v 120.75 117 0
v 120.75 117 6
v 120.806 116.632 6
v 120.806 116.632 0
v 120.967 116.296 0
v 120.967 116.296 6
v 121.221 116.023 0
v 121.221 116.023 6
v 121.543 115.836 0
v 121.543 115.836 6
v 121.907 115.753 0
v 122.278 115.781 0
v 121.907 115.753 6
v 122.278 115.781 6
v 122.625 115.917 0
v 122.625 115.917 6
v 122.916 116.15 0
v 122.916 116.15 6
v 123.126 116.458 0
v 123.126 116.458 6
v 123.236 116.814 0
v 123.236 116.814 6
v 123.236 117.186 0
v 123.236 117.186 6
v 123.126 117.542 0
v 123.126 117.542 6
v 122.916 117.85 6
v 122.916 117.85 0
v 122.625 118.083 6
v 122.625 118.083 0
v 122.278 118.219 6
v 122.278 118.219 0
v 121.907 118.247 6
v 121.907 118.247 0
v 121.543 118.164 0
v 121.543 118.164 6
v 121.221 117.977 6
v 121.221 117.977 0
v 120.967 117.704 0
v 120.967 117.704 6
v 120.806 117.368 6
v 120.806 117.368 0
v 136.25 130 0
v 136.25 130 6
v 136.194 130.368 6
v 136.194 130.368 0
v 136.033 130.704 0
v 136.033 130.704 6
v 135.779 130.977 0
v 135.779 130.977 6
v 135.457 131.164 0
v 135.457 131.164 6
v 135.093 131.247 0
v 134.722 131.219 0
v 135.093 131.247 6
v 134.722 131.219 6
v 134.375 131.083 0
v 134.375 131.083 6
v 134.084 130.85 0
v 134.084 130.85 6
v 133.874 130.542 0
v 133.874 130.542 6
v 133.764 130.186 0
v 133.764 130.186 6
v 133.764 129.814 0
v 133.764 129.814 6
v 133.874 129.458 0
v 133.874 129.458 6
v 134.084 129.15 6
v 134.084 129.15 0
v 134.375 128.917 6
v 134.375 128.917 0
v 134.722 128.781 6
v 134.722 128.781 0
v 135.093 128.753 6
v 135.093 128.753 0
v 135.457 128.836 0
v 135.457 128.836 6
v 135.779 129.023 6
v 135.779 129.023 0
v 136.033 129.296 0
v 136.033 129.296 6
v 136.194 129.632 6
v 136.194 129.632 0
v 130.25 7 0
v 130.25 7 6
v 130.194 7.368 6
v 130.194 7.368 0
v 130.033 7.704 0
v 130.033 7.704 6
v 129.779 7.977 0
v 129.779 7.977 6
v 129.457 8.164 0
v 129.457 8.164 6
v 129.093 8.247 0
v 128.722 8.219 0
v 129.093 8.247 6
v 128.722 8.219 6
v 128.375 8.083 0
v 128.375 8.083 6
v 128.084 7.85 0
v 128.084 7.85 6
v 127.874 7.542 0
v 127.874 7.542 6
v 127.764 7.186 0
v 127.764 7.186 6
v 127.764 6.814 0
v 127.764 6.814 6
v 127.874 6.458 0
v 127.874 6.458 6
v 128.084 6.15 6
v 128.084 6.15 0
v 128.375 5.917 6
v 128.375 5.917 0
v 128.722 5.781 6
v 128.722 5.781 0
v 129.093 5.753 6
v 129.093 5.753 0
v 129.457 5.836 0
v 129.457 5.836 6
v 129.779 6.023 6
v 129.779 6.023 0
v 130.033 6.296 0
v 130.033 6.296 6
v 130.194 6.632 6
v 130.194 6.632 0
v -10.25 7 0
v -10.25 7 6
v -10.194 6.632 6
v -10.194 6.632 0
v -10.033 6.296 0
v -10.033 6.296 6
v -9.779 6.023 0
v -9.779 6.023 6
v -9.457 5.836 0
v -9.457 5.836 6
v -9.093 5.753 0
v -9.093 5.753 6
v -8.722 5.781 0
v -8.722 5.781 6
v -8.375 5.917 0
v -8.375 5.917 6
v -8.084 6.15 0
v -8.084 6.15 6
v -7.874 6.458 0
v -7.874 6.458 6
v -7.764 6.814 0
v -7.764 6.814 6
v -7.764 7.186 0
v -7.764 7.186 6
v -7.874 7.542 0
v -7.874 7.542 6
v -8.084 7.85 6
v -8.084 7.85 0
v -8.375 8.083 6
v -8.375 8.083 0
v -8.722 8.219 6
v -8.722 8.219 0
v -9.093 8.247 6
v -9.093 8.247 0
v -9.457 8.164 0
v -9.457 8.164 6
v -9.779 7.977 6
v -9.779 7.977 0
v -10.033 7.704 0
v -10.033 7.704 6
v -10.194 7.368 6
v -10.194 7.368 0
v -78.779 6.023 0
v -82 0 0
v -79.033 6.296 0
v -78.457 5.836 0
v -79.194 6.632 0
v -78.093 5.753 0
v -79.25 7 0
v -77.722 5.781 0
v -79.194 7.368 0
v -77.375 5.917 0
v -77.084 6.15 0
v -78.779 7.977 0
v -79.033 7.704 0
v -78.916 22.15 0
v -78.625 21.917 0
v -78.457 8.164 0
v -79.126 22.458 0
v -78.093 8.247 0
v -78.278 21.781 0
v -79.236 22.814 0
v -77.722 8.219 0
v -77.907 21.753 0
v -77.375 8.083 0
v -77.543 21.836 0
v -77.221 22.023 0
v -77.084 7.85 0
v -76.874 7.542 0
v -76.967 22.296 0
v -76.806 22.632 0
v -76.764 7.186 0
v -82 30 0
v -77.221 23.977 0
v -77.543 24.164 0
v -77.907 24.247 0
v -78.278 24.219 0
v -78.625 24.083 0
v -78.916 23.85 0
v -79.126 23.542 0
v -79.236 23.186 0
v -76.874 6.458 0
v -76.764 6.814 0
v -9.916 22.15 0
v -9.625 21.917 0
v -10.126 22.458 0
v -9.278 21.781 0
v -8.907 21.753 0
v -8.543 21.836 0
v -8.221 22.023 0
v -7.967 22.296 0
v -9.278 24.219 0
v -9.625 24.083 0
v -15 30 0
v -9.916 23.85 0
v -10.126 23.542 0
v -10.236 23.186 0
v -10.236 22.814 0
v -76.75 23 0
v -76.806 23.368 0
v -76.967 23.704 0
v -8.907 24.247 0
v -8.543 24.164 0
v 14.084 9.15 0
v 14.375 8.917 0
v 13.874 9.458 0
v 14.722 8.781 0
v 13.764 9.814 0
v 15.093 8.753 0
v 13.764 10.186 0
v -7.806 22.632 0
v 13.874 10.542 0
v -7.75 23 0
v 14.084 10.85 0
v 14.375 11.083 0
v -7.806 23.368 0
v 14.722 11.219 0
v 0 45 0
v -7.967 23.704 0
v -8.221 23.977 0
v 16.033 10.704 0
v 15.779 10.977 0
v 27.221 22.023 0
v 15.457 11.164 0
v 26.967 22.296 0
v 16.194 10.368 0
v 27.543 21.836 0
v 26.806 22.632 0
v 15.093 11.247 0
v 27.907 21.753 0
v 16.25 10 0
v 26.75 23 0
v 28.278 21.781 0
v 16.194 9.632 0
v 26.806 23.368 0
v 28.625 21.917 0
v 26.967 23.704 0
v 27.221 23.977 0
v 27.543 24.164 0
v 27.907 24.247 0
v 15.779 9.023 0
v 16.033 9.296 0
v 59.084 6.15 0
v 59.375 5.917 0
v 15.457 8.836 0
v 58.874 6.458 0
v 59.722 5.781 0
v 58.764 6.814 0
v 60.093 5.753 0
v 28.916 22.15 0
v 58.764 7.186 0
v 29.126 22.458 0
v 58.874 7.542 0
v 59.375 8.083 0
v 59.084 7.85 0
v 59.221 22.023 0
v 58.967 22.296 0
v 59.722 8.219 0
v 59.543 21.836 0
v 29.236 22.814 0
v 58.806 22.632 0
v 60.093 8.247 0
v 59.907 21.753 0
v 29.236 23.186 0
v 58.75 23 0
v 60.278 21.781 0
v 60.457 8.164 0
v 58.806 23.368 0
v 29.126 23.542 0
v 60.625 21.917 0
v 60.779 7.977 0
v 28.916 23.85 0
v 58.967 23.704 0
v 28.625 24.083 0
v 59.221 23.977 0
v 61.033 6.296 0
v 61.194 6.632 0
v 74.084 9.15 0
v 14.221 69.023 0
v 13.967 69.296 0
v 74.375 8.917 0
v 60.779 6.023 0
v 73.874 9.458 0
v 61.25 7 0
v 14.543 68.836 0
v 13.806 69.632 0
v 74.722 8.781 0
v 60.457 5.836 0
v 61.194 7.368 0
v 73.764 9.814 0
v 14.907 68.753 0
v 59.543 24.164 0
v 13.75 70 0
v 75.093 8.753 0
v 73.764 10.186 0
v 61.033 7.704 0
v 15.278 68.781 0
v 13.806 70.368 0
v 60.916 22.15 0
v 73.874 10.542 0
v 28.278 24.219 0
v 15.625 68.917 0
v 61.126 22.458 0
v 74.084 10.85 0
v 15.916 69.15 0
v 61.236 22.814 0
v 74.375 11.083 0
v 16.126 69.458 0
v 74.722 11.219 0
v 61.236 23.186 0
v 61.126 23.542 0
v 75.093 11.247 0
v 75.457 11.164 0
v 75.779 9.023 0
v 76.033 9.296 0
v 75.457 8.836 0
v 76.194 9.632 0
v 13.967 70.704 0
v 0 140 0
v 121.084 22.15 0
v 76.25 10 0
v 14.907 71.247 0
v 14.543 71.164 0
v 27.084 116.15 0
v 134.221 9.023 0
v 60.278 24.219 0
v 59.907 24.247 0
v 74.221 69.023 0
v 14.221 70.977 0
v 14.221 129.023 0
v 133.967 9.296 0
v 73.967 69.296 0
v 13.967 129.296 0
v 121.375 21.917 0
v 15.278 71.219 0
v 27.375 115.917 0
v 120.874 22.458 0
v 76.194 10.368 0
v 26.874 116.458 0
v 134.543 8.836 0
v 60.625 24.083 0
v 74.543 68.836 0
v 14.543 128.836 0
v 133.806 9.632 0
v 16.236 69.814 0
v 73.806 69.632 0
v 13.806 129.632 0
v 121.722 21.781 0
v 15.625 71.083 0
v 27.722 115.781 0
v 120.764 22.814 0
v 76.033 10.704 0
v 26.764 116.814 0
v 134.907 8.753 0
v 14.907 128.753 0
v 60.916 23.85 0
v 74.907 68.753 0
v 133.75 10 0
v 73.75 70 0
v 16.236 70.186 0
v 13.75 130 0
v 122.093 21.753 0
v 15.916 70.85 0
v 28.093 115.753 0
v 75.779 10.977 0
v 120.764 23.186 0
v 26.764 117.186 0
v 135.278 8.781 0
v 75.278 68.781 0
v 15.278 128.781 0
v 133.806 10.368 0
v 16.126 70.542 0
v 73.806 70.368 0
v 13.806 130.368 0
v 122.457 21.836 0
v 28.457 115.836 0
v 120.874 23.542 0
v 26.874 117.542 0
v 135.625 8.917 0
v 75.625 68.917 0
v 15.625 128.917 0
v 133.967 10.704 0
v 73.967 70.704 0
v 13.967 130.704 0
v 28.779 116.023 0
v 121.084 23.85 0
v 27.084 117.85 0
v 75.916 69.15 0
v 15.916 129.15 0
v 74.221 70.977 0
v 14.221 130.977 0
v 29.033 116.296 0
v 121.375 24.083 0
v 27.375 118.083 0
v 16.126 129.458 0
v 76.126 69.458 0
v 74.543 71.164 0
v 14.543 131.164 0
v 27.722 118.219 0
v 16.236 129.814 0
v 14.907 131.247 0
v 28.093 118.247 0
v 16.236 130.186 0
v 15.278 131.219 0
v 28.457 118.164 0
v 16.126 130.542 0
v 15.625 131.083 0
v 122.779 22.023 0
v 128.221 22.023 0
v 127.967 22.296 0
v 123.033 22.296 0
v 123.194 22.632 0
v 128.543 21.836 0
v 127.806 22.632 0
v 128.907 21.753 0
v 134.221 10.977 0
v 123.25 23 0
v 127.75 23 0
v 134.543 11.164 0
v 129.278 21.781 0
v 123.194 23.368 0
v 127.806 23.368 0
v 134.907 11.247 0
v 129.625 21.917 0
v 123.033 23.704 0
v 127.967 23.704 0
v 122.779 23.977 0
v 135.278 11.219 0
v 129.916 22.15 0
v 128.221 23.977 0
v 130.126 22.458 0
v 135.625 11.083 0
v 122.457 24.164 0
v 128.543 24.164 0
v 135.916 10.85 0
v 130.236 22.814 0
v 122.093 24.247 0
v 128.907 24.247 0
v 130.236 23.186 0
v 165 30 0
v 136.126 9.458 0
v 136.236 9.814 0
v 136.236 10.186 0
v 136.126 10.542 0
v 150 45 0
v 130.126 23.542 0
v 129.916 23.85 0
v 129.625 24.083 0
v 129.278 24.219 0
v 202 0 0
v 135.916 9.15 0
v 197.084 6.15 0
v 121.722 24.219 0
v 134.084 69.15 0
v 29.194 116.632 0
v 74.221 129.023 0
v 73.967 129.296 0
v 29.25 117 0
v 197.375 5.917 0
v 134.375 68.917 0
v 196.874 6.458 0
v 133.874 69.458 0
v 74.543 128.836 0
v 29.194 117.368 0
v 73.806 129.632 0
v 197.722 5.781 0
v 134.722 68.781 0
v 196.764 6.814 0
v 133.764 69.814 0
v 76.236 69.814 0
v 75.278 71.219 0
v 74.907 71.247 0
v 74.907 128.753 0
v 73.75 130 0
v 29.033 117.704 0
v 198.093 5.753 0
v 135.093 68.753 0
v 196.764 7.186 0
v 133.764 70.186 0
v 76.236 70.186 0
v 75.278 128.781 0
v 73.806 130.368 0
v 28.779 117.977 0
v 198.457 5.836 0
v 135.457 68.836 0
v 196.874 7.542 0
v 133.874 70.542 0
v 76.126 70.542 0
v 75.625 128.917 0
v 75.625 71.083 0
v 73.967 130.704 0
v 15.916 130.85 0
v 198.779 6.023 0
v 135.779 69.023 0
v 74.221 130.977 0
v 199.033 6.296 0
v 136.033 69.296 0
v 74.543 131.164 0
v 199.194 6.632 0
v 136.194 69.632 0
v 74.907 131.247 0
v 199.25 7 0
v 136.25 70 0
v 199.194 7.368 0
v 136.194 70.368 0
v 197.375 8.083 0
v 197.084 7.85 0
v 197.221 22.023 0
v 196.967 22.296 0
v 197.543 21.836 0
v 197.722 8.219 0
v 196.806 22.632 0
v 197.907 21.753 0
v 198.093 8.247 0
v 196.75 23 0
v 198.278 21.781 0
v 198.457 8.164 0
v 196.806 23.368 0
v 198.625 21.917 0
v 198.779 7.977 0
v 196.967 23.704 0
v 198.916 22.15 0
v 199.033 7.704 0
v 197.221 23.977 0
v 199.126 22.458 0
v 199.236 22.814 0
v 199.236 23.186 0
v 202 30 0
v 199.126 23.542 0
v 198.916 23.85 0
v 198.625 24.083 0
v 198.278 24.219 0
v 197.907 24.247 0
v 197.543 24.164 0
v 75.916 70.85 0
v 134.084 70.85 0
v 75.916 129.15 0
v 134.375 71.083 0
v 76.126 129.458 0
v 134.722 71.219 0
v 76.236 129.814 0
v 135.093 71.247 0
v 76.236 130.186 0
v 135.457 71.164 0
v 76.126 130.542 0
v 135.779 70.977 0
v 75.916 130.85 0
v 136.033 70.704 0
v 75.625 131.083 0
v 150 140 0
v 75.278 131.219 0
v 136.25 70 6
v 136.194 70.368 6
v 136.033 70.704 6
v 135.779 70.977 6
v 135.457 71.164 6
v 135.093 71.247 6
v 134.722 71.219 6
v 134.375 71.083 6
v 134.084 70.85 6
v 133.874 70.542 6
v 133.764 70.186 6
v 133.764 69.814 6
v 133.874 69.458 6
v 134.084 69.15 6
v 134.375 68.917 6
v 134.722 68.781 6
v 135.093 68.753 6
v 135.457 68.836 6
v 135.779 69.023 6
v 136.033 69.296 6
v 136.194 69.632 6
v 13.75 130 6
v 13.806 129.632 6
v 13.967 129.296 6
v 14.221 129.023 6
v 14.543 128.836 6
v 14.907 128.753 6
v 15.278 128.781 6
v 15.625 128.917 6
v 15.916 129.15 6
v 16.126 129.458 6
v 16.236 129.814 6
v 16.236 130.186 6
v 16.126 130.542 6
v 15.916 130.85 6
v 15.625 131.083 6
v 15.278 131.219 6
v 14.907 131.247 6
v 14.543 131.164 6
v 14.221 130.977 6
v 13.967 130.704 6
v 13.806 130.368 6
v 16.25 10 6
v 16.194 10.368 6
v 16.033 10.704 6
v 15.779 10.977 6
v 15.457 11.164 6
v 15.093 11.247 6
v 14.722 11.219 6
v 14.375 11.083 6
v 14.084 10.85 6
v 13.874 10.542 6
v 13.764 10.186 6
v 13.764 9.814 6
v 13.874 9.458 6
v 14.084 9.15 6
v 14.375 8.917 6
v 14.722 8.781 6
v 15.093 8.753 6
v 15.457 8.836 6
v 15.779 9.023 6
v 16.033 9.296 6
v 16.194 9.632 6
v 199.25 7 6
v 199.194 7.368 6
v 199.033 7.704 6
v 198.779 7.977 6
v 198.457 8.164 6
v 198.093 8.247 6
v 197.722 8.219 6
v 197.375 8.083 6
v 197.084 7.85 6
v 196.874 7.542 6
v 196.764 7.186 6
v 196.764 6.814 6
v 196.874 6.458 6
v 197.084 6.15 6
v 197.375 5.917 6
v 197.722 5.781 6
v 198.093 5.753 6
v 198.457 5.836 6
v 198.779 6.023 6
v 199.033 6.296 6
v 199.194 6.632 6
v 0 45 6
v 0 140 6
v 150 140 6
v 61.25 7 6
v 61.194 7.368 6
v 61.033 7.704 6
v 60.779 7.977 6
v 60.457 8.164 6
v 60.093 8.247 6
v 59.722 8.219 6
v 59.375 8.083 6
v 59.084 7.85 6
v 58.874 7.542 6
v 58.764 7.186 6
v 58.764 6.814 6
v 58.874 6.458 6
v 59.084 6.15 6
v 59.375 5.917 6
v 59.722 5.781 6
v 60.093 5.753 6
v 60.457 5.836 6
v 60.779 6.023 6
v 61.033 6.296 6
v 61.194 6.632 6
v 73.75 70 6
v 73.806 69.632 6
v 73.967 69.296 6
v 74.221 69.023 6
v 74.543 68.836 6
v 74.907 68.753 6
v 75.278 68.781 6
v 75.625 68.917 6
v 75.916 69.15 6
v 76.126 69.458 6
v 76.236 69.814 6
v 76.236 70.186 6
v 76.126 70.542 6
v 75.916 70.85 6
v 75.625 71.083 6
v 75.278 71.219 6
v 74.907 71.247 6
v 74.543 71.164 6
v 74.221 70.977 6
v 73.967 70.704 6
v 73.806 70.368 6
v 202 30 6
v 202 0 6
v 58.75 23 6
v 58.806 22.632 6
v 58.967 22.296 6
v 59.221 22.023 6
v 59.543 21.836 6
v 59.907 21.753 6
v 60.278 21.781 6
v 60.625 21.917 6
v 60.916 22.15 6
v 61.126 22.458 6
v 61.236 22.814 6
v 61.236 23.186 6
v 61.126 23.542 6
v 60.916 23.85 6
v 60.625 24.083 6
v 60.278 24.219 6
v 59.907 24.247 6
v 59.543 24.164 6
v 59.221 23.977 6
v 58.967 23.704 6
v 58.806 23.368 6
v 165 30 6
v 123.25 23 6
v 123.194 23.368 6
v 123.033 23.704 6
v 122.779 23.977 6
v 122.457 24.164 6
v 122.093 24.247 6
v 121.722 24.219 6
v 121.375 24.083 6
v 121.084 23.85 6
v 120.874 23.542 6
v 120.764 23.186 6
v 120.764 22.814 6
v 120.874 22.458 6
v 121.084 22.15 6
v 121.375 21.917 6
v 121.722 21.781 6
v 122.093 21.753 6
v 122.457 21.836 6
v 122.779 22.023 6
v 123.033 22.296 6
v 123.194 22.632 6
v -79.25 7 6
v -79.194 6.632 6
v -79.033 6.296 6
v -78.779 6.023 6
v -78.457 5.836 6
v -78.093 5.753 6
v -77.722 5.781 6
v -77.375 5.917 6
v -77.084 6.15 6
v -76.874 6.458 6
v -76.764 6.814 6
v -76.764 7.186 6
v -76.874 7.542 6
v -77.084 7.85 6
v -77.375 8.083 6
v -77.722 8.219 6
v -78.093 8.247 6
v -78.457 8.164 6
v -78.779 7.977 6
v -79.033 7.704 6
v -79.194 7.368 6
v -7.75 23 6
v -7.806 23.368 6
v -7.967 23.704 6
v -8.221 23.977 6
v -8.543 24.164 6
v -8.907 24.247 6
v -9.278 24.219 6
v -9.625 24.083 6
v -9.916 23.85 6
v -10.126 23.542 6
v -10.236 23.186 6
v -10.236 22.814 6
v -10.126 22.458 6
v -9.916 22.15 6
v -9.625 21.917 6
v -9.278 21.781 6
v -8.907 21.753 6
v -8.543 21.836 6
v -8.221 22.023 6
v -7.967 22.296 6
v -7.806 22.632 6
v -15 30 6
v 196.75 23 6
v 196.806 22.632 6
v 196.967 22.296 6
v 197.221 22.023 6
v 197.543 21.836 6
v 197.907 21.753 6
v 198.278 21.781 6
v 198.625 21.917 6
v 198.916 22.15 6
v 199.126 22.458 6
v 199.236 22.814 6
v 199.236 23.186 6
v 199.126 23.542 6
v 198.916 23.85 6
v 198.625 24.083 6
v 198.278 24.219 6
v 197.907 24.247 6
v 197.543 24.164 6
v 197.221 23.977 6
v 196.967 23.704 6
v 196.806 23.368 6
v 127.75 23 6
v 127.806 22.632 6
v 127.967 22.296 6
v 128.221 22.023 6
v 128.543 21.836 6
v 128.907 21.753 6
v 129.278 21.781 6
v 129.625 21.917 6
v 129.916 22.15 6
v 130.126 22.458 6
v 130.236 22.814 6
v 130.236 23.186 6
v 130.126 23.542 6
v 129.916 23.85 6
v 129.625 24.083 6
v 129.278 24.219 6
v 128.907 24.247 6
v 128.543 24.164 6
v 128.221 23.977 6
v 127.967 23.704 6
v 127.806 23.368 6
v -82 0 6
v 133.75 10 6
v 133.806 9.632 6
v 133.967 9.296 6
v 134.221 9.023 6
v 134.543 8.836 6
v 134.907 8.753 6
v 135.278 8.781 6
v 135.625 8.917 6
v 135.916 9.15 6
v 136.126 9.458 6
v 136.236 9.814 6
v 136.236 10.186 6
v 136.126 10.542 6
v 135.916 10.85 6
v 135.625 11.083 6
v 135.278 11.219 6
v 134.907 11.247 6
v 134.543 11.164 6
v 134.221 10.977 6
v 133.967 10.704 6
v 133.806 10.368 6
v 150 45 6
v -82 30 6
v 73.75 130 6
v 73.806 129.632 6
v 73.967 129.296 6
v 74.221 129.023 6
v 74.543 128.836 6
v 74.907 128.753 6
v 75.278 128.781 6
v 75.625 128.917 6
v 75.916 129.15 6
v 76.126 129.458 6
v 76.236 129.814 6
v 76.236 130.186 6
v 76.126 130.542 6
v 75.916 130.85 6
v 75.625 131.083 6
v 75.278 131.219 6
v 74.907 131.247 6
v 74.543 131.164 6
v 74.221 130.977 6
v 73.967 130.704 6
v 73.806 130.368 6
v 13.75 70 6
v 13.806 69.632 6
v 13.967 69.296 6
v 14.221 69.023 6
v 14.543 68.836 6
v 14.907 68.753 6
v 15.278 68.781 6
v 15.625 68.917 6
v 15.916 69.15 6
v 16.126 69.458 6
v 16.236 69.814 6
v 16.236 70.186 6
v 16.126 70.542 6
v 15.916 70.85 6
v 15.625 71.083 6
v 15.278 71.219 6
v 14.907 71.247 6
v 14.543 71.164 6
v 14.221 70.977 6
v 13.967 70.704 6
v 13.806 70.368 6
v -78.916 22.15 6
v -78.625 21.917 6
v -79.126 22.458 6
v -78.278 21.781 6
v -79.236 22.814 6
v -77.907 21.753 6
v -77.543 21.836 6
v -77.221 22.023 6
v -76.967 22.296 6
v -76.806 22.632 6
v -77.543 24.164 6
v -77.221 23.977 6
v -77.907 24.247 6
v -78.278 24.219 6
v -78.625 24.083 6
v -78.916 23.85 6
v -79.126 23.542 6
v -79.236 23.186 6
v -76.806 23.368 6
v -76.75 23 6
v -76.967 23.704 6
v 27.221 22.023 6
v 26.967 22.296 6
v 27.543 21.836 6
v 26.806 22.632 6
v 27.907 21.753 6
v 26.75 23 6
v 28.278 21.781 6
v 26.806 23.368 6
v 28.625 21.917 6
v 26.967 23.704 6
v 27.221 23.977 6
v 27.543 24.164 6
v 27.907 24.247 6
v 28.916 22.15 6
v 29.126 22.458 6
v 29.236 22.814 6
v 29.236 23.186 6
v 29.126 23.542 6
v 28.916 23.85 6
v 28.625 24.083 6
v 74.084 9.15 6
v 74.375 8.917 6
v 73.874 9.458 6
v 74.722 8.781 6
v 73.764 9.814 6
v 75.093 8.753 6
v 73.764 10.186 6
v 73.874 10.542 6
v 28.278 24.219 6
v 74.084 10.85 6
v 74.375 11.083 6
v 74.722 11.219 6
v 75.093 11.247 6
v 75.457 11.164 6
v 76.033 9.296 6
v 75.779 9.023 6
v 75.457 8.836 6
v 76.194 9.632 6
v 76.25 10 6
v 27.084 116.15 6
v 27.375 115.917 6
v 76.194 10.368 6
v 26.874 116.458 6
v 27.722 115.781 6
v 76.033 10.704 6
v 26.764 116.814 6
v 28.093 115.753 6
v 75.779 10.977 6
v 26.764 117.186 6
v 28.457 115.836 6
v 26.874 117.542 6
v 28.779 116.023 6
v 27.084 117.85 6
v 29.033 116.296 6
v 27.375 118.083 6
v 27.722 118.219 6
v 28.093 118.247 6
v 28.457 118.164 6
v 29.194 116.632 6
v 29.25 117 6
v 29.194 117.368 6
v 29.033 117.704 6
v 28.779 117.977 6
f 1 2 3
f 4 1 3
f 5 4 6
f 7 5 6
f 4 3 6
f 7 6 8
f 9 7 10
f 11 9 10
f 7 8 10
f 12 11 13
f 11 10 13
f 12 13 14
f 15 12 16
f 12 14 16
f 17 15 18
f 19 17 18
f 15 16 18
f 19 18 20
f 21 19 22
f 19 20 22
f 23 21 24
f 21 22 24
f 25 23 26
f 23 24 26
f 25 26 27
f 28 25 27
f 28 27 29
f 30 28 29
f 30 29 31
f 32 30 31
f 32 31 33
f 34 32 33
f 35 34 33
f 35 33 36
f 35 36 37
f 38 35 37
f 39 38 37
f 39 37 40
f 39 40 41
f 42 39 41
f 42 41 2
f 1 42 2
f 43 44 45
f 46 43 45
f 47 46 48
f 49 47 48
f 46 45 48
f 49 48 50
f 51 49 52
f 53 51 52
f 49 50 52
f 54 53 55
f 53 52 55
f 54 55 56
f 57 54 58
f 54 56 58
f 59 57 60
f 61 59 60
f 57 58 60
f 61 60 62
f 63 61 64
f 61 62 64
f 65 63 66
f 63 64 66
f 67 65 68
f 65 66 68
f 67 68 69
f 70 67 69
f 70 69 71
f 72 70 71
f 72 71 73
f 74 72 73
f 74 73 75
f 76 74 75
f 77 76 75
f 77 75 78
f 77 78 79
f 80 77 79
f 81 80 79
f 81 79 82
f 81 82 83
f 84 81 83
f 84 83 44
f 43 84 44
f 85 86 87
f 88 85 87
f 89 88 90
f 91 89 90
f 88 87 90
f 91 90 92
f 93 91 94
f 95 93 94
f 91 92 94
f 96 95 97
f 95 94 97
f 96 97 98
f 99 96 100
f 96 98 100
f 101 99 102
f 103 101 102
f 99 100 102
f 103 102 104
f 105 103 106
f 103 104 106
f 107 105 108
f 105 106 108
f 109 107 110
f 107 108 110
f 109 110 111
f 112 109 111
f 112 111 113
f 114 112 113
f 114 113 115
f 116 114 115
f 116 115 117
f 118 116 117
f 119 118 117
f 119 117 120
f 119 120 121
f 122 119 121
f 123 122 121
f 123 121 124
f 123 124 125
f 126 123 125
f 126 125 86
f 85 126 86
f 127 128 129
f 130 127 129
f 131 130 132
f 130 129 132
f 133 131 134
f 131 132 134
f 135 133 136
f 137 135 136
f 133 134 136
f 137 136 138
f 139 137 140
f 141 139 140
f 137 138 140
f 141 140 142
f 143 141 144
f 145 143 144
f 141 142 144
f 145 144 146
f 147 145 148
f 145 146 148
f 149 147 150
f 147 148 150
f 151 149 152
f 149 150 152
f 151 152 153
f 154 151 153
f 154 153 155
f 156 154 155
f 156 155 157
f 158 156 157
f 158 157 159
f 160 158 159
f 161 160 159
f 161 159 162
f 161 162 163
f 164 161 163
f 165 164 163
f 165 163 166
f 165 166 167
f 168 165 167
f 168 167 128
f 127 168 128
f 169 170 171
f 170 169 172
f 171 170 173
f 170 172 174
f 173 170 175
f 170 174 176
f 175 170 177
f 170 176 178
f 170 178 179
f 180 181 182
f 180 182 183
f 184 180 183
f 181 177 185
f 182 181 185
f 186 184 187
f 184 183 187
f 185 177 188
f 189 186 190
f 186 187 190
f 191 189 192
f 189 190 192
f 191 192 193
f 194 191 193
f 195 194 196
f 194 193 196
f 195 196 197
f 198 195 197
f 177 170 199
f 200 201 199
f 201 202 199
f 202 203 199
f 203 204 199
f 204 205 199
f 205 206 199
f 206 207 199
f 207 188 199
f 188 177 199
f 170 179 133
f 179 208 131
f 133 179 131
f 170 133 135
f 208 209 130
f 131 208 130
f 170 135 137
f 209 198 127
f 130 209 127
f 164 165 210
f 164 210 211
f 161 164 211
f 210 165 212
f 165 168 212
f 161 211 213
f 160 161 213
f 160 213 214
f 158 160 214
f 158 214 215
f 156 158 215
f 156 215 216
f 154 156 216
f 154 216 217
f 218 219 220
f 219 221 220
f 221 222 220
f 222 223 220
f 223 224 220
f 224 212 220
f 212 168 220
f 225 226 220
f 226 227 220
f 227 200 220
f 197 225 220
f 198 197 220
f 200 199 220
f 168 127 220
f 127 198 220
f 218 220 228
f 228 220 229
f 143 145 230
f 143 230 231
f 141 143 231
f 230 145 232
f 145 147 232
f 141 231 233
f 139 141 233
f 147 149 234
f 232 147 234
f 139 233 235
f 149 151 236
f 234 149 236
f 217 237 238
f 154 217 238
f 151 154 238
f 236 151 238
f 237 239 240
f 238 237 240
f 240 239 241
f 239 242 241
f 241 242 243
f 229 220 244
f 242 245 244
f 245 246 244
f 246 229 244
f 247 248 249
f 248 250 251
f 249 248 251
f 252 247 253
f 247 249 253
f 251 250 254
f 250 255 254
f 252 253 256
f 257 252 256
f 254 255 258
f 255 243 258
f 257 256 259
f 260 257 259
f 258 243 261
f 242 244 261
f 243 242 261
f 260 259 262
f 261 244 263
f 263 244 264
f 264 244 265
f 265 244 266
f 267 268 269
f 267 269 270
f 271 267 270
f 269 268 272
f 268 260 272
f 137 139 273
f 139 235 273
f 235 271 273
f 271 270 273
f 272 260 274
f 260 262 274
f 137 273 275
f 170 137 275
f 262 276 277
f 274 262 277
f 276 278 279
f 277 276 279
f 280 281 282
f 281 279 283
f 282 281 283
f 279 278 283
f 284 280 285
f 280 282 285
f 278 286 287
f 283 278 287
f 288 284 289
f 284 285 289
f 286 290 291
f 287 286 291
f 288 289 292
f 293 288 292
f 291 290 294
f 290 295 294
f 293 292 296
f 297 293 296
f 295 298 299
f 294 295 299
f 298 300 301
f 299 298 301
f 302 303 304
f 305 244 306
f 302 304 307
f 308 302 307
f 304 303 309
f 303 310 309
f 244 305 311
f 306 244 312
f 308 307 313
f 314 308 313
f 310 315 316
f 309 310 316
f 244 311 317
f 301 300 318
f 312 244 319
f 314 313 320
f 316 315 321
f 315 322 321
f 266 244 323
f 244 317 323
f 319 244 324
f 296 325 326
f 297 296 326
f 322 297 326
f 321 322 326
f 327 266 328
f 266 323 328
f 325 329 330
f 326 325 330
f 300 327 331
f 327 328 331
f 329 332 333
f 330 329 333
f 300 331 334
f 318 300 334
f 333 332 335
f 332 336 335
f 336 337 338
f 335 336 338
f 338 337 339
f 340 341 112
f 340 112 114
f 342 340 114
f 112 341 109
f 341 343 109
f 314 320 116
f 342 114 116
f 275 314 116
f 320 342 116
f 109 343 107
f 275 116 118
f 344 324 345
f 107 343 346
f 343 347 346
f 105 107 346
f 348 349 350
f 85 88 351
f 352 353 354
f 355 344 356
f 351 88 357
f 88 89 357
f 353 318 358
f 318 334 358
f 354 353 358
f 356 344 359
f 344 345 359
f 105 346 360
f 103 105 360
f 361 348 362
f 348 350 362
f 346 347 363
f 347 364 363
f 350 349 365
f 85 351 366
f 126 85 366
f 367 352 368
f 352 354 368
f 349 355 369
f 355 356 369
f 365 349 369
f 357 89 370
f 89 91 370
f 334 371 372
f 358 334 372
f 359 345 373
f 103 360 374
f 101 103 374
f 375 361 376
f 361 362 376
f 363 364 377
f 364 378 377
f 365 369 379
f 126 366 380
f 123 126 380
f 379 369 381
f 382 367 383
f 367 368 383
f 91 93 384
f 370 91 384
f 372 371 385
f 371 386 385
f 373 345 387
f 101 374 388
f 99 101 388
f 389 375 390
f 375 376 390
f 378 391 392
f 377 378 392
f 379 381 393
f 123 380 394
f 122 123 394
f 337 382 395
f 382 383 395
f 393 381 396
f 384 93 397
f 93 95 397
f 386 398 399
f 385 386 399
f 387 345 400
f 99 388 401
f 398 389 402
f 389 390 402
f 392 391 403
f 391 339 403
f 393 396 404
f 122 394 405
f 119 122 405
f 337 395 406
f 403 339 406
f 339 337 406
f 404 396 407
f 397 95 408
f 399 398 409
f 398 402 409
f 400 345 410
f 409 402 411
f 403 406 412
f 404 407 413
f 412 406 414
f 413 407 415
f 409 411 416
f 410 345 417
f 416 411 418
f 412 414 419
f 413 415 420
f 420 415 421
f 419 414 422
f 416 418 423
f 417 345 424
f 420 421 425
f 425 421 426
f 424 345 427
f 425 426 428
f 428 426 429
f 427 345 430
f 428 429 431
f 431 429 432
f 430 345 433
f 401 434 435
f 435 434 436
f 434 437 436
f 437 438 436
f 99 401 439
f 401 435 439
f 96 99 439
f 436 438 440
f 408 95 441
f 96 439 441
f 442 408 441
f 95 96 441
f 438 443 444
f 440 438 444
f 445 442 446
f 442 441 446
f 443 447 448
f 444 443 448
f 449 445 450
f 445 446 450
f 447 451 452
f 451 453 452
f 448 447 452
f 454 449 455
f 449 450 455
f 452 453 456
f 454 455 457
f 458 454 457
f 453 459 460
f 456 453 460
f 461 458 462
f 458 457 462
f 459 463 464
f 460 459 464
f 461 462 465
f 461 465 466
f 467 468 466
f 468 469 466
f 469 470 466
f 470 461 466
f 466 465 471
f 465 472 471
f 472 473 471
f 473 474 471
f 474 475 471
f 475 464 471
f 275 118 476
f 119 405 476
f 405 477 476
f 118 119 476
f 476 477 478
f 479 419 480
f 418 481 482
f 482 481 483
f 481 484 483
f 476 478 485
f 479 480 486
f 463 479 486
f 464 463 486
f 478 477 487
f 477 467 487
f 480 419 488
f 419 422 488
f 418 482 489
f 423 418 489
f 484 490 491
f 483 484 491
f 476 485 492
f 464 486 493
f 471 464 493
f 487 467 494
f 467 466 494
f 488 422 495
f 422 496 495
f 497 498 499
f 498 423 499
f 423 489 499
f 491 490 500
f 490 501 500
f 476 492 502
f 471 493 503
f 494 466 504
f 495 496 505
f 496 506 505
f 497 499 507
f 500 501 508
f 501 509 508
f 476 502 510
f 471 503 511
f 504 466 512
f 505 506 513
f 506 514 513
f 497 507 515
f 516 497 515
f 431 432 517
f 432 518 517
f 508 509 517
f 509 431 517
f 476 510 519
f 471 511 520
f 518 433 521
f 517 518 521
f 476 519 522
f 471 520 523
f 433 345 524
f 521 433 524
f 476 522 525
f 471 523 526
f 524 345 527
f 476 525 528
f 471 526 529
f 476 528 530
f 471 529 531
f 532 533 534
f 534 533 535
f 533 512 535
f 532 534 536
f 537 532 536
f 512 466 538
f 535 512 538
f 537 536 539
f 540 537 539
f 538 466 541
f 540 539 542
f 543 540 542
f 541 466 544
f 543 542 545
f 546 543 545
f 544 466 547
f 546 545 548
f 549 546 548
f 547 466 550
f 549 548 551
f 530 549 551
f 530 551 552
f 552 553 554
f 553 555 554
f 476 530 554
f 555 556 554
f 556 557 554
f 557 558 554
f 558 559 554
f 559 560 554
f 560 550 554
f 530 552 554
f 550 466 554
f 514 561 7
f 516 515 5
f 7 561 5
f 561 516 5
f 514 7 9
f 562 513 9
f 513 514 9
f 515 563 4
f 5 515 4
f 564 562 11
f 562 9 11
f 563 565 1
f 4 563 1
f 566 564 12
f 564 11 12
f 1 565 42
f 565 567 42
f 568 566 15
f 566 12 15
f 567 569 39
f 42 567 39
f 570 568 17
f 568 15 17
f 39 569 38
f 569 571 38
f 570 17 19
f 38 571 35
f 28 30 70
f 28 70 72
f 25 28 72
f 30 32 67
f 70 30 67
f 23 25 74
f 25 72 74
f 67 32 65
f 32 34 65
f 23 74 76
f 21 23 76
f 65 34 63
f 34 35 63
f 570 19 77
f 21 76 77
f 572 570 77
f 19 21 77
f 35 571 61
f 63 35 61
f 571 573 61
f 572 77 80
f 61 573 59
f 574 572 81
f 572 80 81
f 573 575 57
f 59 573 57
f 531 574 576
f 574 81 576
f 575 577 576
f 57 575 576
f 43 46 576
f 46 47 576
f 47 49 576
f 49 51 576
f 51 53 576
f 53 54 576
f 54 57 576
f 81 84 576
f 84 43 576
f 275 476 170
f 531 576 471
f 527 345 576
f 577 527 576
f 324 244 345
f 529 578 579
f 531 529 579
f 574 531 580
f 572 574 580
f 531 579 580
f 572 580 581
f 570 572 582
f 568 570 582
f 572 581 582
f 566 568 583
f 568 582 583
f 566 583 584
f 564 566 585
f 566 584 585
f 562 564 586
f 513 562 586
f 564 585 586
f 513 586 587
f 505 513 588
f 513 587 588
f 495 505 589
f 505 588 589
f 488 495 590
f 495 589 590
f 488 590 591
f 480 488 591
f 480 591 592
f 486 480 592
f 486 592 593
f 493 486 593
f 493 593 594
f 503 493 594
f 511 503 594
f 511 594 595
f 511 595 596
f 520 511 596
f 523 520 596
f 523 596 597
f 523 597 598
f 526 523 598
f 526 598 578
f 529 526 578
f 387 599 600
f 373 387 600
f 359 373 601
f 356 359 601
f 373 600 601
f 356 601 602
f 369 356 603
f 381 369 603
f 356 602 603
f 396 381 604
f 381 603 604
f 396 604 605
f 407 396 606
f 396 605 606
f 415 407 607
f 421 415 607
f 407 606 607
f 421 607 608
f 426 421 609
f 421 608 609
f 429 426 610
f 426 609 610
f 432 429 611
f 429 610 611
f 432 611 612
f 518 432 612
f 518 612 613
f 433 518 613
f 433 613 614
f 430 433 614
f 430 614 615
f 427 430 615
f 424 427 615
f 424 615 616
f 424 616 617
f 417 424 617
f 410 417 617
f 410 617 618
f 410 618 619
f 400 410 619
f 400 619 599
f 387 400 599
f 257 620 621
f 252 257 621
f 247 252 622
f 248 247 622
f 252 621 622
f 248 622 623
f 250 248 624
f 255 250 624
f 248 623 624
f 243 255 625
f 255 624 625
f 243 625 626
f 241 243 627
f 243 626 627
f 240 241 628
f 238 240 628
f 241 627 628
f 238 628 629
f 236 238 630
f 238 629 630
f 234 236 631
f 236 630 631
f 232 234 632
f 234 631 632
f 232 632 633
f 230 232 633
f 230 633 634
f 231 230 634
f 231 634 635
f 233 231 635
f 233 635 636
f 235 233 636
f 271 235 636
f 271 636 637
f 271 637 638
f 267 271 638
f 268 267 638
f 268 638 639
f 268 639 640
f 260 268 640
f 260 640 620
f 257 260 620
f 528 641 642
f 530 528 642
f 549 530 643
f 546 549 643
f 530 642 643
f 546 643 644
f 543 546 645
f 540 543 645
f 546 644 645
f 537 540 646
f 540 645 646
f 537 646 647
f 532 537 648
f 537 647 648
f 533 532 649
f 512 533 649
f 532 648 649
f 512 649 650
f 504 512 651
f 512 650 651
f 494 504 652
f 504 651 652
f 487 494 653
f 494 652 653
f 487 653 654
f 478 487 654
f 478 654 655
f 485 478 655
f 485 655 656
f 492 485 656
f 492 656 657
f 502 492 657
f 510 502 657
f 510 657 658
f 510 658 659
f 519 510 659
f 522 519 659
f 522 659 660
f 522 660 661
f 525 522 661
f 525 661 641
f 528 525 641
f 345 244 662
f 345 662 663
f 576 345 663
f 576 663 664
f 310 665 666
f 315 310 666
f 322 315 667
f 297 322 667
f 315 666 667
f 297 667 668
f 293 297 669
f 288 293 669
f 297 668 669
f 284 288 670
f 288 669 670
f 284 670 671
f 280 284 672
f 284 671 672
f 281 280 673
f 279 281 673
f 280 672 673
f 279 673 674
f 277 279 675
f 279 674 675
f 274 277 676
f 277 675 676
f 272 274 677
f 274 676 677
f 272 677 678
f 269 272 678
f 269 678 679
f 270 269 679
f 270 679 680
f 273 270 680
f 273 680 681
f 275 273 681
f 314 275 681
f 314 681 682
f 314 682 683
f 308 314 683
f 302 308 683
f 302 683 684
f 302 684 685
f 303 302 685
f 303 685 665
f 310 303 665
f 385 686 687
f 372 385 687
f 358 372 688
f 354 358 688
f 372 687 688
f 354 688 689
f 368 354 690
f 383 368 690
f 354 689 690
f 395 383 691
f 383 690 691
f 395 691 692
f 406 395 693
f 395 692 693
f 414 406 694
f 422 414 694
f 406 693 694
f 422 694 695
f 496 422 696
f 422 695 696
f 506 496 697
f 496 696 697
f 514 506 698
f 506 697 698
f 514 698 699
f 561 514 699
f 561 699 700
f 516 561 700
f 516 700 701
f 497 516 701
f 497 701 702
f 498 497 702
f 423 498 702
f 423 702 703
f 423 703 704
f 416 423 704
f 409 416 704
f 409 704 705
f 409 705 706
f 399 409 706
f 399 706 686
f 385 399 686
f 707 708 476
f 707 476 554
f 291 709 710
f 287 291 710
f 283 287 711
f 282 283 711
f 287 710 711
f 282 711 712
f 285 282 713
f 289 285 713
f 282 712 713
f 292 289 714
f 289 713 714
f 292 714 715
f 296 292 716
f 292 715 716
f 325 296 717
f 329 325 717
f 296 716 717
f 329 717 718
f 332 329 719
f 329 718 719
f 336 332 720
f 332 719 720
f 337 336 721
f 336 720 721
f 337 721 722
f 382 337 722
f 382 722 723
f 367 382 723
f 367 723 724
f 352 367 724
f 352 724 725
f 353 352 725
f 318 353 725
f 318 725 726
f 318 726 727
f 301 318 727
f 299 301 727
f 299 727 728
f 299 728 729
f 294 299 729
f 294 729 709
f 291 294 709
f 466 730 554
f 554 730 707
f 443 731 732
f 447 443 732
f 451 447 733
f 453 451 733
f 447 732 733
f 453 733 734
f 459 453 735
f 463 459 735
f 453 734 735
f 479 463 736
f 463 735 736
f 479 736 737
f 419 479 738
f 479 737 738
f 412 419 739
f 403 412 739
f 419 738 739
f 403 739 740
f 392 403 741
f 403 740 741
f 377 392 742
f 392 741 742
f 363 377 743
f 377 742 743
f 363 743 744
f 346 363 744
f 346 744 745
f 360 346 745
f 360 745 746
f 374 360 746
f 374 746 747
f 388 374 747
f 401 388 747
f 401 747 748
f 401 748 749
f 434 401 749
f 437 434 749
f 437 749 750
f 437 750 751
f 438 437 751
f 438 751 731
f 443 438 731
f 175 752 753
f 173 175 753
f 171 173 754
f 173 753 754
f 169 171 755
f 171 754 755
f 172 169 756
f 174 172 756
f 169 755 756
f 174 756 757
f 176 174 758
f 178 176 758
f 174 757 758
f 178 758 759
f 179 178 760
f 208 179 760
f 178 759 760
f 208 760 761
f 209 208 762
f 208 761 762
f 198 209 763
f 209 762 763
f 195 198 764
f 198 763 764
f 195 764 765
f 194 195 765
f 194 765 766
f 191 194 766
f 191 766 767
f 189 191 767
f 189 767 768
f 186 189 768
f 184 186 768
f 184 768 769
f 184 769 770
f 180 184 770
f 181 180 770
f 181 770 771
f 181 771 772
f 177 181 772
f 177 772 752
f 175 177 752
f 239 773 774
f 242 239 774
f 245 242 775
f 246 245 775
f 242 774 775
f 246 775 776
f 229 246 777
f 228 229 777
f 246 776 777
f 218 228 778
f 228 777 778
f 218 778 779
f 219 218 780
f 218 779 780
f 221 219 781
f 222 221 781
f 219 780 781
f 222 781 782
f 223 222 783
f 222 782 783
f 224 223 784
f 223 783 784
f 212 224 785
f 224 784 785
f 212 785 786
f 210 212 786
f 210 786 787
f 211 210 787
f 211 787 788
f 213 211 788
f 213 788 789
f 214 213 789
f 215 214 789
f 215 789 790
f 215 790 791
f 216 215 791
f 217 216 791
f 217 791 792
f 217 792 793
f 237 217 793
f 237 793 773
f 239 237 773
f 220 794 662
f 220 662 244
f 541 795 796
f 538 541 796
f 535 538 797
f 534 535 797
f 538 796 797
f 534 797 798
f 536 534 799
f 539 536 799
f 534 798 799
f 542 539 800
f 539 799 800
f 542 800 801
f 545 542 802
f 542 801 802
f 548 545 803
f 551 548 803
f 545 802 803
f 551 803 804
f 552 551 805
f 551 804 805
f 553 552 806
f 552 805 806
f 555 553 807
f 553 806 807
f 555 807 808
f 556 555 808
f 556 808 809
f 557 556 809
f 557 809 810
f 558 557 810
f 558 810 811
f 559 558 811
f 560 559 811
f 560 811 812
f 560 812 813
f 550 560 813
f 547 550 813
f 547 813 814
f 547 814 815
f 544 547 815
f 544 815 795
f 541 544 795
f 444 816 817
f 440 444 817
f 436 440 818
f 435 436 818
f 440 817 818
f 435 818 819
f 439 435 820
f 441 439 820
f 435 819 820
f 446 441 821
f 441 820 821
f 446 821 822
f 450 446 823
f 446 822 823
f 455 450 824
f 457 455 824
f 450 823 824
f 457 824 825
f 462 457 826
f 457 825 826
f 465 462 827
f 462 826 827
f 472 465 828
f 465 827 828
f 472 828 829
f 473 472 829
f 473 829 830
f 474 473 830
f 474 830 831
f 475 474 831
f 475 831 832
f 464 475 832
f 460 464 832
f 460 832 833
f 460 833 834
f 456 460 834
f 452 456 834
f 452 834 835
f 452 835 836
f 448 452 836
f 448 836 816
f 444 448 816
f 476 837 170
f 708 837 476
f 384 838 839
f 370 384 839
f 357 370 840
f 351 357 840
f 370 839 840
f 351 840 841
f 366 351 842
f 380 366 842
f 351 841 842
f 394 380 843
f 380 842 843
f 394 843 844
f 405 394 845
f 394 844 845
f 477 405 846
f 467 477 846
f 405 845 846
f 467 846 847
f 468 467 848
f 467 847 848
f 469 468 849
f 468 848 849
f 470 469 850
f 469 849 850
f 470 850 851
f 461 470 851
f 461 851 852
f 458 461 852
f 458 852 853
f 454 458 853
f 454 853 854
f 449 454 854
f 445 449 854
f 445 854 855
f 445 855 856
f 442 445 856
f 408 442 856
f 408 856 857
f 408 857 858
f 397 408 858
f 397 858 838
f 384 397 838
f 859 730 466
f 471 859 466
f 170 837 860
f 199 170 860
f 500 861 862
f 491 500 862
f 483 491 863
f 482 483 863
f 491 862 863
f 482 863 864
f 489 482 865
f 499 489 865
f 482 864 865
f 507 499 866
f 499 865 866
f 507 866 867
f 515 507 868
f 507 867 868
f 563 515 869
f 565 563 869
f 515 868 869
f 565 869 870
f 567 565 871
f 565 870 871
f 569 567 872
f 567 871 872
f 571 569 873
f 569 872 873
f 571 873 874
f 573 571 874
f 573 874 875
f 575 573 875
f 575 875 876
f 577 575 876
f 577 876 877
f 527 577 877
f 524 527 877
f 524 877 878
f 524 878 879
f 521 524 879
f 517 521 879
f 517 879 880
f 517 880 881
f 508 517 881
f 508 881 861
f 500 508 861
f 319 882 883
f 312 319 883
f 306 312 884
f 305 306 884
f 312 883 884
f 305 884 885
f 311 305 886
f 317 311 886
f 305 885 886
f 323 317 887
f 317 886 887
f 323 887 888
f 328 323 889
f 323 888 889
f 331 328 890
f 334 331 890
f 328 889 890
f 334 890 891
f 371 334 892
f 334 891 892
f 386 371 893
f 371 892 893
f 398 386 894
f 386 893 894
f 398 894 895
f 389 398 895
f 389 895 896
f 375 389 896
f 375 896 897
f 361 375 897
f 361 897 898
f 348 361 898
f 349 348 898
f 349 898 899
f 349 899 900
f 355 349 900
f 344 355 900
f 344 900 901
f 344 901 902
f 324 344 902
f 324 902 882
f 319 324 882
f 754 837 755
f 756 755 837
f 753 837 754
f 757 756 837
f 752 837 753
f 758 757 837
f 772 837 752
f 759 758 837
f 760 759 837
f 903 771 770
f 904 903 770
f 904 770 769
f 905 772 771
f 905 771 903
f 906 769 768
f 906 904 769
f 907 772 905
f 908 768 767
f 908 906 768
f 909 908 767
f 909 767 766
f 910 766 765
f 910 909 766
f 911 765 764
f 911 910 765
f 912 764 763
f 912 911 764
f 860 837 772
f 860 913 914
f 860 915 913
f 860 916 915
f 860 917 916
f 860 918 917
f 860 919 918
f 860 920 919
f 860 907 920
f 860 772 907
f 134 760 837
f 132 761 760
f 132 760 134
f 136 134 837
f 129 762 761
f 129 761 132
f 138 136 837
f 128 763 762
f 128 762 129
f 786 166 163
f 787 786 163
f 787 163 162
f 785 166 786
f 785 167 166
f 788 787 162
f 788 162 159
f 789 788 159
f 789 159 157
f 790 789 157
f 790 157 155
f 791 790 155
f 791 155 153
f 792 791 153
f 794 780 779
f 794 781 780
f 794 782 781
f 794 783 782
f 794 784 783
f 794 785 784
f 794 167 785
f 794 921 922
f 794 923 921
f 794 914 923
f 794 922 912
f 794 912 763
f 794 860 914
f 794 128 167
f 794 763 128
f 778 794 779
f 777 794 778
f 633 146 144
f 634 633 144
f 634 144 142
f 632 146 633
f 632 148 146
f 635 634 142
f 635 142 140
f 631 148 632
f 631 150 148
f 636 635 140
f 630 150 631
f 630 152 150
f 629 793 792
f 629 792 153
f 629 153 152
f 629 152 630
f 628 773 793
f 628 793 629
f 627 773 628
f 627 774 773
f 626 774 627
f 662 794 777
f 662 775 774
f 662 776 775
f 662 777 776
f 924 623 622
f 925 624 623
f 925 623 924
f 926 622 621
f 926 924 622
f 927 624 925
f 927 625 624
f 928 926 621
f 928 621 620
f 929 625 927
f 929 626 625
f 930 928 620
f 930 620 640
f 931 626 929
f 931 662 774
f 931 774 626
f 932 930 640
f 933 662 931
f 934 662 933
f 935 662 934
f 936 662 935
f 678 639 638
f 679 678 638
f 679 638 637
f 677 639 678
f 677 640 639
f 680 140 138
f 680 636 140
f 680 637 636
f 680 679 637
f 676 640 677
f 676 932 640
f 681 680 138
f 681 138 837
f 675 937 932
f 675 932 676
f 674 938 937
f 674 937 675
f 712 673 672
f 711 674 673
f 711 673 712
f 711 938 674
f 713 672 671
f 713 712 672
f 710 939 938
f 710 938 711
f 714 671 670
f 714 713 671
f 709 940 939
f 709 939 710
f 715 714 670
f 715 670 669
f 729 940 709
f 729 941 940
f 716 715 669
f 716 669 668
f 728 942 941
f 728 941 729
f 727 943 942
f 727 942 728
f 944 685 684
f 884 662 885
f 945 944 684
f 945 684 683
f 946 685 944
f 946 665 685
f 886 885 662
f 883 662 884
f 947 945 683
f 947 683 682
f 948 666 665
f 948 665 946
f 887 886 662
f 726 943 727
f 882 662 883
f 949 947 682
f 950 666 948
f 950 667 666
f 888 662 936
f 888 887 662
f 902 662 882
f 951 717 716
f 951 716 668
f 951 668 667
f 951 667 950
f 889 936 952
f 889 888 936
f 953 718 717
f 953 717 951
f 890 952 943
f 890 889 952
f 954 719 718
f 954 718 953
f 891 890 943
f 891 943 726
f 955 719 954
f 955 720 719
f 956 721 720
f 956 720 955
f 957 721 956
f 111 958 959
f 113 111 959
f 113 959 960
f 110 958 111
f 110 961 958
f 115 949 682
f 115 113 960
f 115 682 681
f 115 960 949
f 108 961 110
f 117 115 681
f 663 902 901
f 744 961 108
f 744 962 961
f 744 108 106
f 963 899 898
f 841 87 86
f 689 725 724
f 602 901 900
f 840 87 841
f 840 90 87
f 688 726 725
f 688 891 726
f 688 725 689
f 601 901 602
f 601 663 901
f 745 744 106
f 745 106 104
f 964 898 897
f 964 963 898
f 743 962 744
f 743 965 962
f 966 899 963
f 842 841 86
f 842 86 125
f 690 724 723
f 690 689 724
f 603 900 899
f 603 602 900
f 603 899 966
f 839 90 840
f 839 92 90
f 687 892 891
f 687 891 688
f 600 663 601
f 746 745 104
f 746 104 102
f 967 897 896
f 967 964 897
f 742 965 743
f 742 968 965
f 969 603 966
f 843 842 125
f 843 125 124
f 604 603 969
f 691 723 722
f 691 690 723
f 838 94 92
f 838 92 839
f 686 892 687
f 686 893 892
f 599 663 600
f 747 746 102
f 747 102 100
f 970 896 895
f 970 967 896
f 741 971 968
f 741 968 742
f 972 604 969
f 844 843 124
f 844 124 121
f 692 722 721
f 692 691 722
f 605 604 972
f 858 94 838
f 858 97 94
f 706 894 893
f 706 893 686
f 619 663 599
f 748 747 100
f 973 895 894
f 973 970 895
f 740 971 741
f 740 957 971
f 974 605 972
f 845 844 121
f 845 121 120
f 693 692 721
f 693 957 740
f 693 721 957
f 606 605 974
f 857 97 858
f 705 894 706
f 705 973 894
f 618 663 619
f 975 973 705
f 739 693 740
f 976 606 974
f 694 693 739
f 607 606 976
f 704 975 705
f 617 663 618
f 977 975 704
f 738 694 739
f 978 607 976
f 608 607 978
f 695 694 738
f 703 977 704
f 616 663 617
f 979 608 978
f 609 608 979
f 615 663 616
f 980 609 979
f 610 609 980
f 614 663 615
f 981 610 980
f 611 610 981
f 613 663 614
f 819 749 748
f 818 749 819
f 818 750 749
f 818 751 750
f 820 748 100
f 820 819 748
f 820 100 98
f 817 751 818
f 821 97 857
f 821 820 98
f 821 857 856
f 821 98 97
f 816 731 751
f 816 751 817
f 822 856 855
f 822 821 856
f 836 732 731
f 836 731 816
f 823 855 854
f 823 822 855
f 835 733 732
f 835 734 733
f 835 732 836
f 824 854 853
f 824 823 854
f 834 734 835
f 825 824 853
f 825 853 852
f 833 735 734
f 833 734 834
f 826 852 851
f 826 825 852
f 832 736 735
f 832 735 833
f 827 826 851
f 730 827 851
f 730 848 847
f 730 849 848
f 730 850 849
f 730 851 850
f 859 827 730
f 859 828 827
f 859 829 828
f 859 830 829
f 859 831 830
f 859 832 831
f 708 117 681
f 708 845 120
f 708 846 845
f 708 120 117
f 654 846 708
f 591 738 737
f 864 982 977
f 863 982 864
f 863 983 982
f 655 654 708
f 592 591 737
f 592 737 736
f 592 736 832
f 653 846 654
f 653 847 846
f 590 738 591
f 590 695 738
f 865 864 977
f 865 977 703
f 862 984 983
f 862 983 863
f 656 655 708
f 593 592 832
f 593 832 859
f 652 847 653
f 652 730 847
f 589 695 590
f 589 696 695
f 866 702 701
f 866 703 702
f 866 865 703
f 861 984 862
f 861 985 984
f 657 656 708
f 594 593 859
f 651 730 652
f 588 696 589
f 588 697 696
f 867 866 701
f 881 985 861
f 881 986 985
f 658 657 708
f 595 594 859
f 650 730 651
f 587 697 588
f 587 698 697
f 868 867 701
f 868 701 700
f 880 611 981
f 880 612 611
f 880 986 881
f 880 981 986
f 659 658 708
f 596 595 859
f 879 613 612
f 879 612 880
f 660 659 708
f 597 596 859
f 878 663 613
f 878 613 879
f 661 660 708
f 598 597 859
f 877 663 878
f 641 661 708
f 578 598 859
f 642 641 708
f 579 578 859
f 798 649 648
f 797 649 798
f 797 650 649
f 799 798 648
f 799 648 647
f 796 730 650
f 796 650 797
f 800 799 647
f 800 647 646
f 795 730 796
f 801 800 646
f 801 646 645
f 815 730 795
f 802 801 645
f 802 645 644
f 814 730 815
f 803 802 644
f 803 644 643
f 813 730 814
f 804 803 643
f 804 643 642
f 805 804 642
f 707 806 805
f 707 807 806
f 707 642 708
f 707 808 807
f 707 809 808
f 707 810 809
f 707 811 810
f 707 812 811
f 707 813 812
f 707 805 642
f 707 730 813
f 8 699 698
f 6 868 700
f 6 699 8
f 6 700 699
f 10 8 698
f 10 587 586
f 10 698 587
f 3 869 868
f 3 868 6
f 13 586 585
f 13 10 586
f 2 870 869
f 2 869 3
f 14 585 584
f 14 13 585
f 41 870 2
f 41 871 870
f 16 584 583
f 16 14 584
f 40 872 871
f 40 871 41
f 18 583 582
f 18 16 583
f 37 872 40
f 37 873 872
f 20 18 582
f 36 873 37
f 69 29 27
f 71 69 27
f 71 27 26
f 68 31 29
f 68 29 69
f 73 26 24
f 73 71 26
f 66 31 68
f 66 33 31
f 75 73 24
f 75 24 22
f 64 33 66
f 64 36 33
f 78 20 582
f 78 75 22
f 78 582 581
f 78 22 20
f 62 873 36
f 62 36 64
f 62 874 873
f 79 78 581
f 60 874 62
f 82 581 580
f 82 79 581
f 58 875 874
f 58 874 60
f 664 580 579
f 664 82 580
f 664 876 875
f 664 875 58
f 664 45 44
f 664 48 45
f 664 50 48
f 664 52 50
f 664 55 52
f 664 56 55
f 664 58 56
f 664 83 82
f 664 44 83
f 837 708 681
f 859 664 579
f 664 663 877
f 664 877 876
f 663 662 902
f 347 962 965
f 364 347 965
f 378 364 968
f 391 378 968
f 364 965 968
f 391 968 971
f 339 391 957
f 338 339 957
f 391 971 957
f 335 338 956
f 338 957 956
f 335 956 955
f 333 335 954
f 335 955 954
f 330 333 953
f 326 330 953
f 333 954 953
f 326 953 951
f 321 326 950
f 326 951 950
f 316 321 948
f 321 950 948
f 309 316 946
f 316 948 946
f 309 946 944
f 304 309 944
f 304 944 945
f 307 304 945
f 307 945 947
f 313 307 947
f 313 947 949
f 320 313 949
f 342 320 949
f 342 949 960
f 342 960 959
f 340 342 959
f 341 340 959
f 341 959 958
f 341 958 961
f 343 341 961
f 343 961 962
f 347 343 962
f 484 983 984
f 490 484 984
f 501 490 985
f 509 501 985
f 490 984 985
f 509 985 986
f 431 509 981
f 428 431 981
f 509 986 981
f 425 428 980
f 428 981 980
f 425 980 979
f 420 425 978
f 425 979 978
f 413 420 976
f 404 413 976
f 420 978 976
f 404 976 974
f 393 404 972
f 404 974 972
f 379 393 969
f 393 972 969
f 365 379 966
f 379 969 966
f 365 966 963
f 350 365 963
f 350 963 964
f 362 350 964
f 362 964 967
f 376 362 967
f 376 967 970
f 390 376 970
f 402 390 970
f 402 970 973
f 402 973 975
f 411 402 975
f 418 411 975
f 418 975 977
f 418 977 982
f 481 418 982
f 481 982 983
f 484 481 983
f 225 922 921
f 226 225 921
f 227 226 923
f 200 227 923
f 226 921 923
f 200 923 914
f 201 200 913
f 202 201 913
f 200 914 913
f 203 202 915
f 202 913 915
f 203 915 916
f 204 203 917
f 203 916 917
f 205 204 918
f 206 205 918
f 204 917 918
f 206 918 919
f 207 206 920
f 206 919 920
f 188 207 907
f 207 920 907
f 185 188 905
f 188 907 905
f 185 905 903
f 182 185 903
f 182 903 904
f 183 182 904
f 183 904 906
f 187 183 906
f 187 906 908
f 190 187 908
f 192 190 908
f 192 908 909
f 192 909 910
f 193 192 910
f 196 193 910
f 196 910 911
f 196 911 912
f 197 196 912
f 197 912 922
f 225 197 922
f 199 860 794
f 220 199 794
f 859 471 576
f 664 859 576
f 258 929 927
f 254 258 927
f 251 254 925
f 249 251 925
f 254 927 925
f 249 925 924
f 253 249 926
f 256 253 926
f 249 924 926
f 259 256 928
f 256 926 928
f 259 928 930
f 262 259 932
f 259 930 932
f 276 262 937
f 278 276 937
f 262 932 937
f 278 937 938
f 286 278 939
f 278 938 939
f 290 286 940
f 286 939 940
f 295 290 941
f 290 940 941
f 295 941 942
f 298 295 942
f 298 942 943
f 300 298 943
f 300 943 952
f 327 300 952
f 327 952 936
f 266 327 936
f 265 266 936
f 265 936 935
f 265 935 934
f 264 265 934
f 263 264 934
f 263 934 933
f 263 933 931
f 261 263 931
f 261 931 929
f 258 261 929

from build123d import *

# Parameters (mm, degrees)
ESQUISSE1_W             = 150
ESQUISSE1_H             = 140
BOSS_EXTRU_1_DEPTH      = 6
ESQUISSE2_R             = 1.25
ENL_V_MAT_EXTRU_1_DEPTH = 206.270553173
ESQUISSE3_R             = 1.25
ENL_V_MAT_EXTRU_2_DEPTH = 206.270553173
ESQUISSE4_W             = 82
ESQUISSE4_H             = 30
ESQUISSE4_W_2           = 52
BOSS_EXTRU_2_DEPTH      = 6
ESQUISSE5_R             = 1.25
ENL_V_MAT_EXTRU_3_DEPTH = 246.845479926
CHANFREIN1_SIZE         = 15


with BuildPart() as part:
    # Esquisse1 → Boss.-Extru.1 (new body)
    with BuildSketch(Plane.XY):
        with Locations((75, 70)):
            Rectangle(ESQUISSE1_W, ESQUISSE1_H)
    extrude(amount=BOSS_EXTRU_1_DEPTH)

    # Esquisse2 → Enlèv. mat.-Extru.1 (cut, through all)
    with BuildSketch(Plane.XY.offset(6)):
        with Locations((28, 117)):
            Circle(ESQUISSE2_R)
        with Locations(Location((122, 117, 0), (0, 0, 180))):
            Circle(ESQUISSE2_R)
        with Locations((122, 23)):
            Circle(ESQUISSE2_R)
        with Locations(Location((28, 23, 0), (0, 0, 180))):
            Circle(ESQUISSE2_R)
    extrude(amount=-ENL_V_MAT_EXTRU_1_DEPTH, mode=Mode.SUBTRACT)

    # Esquisse3 → Enlèv. mat.-Extru.2 (cut, through all)
    with BuildSketch(Plane.XY.offset(6)):
        with Locations((75, 10)):
            Circle(ESQUISSE3_R)
        with Locations((15, 10)):
            Circle(ESQUISSE3_R)
        with Locations(Location((135, 10, 0), (0, 0, 180))):
            Circle(ESQUISSE3_R)
        with Locations((135, 70)):
            Circle(ESQUISSE3_R)
        with Locations(Location((15, 70, 0), (0, 0, 180))):
            Circle(ESQUISSE3_R)
        with Locations(Location((75, 70, 0), (0, 0, 180))):
            Circle(ESQUISSE3_R)
        with Locations((135, 130)):
            Circle(ESQUISSE3_R)
        with Locations(Location((15, 130, 0), (0, 0, 180))):
            Circle(ESQUISSE3_R)
        with Locations(Location((75, 130, 0), (0, 0, 180))):
            Circle(ESQUISSE3_R)
    extrude(amount=-ENL_V_MAT_EXTRU_2_DEPTH, mode=Mode.SUBTRACT)

    # Esquisse4 → Boss.-Extru.2 (add)
    with BuildSketch(Plane.XY.offset(6)):
        with Locations((-41, 15)):
            Rectangle(ESQUISSE4_W, ESQUISSE4_H)
        with Locations((176, 15)):
            Rectangle(ESQUISSE4_W_2, ESQUISSE4_H)
    extrude(amount=-BOSS_EXTRU_2_DEPTH)

    # Esquisse5 → Enlèv. mat.-Extru.3 (cut, through all)
    with BuildSketch(Plane.XY.offset(6)):
        with Locations((-78, 23)):
            Circle(ESQUISSE5_R)
        with Locations(Location((-78, 7, 0), (0, 0, 180))):
            Circle(ESQUISSE5_R)
        with Locations((198, 7)):
            Circle(ESQUISSE5_R)
        with Locations(Location((198, 23, 0), (0, 0, 180))):
            Circle(ESQUISSE5_R)
        with Locations((60, 7)):
            Circle(ESQUISSE5_R)
        with Locations(Location((60, 23, 0), (0, 0, 180))):
            Circle(ESQUISSE5_R)
        with Locations((-9, 23)):
            Circle(ESQUISSE5_R)
        with Locations(Location((-9, 7, 0), (0, 0, 180))):
            Circle(ESQUISSE5_R)
        with Locations((129, 7)):
            Circle(ESQUISSE5_R)
        with Locations(Location((129, 23, 0), (0, 0, 180))):
            Circle(ESQUISSE5_R)
    extrude(amount=-ENL_V_MAT_EXTRU_3_DEPTH, mode=Mode.SUBTRACT)

    # Chanfrein1
    chanfrein1_edges = [part.edges().sort_by_distance(p)[0] for p in [
        (0, 30, 3),
        (150, 30, 3),
    ]]
    chamfer(chanfrein1_edges, length=CHANFREIN1_SIZE)


solid = part.part
